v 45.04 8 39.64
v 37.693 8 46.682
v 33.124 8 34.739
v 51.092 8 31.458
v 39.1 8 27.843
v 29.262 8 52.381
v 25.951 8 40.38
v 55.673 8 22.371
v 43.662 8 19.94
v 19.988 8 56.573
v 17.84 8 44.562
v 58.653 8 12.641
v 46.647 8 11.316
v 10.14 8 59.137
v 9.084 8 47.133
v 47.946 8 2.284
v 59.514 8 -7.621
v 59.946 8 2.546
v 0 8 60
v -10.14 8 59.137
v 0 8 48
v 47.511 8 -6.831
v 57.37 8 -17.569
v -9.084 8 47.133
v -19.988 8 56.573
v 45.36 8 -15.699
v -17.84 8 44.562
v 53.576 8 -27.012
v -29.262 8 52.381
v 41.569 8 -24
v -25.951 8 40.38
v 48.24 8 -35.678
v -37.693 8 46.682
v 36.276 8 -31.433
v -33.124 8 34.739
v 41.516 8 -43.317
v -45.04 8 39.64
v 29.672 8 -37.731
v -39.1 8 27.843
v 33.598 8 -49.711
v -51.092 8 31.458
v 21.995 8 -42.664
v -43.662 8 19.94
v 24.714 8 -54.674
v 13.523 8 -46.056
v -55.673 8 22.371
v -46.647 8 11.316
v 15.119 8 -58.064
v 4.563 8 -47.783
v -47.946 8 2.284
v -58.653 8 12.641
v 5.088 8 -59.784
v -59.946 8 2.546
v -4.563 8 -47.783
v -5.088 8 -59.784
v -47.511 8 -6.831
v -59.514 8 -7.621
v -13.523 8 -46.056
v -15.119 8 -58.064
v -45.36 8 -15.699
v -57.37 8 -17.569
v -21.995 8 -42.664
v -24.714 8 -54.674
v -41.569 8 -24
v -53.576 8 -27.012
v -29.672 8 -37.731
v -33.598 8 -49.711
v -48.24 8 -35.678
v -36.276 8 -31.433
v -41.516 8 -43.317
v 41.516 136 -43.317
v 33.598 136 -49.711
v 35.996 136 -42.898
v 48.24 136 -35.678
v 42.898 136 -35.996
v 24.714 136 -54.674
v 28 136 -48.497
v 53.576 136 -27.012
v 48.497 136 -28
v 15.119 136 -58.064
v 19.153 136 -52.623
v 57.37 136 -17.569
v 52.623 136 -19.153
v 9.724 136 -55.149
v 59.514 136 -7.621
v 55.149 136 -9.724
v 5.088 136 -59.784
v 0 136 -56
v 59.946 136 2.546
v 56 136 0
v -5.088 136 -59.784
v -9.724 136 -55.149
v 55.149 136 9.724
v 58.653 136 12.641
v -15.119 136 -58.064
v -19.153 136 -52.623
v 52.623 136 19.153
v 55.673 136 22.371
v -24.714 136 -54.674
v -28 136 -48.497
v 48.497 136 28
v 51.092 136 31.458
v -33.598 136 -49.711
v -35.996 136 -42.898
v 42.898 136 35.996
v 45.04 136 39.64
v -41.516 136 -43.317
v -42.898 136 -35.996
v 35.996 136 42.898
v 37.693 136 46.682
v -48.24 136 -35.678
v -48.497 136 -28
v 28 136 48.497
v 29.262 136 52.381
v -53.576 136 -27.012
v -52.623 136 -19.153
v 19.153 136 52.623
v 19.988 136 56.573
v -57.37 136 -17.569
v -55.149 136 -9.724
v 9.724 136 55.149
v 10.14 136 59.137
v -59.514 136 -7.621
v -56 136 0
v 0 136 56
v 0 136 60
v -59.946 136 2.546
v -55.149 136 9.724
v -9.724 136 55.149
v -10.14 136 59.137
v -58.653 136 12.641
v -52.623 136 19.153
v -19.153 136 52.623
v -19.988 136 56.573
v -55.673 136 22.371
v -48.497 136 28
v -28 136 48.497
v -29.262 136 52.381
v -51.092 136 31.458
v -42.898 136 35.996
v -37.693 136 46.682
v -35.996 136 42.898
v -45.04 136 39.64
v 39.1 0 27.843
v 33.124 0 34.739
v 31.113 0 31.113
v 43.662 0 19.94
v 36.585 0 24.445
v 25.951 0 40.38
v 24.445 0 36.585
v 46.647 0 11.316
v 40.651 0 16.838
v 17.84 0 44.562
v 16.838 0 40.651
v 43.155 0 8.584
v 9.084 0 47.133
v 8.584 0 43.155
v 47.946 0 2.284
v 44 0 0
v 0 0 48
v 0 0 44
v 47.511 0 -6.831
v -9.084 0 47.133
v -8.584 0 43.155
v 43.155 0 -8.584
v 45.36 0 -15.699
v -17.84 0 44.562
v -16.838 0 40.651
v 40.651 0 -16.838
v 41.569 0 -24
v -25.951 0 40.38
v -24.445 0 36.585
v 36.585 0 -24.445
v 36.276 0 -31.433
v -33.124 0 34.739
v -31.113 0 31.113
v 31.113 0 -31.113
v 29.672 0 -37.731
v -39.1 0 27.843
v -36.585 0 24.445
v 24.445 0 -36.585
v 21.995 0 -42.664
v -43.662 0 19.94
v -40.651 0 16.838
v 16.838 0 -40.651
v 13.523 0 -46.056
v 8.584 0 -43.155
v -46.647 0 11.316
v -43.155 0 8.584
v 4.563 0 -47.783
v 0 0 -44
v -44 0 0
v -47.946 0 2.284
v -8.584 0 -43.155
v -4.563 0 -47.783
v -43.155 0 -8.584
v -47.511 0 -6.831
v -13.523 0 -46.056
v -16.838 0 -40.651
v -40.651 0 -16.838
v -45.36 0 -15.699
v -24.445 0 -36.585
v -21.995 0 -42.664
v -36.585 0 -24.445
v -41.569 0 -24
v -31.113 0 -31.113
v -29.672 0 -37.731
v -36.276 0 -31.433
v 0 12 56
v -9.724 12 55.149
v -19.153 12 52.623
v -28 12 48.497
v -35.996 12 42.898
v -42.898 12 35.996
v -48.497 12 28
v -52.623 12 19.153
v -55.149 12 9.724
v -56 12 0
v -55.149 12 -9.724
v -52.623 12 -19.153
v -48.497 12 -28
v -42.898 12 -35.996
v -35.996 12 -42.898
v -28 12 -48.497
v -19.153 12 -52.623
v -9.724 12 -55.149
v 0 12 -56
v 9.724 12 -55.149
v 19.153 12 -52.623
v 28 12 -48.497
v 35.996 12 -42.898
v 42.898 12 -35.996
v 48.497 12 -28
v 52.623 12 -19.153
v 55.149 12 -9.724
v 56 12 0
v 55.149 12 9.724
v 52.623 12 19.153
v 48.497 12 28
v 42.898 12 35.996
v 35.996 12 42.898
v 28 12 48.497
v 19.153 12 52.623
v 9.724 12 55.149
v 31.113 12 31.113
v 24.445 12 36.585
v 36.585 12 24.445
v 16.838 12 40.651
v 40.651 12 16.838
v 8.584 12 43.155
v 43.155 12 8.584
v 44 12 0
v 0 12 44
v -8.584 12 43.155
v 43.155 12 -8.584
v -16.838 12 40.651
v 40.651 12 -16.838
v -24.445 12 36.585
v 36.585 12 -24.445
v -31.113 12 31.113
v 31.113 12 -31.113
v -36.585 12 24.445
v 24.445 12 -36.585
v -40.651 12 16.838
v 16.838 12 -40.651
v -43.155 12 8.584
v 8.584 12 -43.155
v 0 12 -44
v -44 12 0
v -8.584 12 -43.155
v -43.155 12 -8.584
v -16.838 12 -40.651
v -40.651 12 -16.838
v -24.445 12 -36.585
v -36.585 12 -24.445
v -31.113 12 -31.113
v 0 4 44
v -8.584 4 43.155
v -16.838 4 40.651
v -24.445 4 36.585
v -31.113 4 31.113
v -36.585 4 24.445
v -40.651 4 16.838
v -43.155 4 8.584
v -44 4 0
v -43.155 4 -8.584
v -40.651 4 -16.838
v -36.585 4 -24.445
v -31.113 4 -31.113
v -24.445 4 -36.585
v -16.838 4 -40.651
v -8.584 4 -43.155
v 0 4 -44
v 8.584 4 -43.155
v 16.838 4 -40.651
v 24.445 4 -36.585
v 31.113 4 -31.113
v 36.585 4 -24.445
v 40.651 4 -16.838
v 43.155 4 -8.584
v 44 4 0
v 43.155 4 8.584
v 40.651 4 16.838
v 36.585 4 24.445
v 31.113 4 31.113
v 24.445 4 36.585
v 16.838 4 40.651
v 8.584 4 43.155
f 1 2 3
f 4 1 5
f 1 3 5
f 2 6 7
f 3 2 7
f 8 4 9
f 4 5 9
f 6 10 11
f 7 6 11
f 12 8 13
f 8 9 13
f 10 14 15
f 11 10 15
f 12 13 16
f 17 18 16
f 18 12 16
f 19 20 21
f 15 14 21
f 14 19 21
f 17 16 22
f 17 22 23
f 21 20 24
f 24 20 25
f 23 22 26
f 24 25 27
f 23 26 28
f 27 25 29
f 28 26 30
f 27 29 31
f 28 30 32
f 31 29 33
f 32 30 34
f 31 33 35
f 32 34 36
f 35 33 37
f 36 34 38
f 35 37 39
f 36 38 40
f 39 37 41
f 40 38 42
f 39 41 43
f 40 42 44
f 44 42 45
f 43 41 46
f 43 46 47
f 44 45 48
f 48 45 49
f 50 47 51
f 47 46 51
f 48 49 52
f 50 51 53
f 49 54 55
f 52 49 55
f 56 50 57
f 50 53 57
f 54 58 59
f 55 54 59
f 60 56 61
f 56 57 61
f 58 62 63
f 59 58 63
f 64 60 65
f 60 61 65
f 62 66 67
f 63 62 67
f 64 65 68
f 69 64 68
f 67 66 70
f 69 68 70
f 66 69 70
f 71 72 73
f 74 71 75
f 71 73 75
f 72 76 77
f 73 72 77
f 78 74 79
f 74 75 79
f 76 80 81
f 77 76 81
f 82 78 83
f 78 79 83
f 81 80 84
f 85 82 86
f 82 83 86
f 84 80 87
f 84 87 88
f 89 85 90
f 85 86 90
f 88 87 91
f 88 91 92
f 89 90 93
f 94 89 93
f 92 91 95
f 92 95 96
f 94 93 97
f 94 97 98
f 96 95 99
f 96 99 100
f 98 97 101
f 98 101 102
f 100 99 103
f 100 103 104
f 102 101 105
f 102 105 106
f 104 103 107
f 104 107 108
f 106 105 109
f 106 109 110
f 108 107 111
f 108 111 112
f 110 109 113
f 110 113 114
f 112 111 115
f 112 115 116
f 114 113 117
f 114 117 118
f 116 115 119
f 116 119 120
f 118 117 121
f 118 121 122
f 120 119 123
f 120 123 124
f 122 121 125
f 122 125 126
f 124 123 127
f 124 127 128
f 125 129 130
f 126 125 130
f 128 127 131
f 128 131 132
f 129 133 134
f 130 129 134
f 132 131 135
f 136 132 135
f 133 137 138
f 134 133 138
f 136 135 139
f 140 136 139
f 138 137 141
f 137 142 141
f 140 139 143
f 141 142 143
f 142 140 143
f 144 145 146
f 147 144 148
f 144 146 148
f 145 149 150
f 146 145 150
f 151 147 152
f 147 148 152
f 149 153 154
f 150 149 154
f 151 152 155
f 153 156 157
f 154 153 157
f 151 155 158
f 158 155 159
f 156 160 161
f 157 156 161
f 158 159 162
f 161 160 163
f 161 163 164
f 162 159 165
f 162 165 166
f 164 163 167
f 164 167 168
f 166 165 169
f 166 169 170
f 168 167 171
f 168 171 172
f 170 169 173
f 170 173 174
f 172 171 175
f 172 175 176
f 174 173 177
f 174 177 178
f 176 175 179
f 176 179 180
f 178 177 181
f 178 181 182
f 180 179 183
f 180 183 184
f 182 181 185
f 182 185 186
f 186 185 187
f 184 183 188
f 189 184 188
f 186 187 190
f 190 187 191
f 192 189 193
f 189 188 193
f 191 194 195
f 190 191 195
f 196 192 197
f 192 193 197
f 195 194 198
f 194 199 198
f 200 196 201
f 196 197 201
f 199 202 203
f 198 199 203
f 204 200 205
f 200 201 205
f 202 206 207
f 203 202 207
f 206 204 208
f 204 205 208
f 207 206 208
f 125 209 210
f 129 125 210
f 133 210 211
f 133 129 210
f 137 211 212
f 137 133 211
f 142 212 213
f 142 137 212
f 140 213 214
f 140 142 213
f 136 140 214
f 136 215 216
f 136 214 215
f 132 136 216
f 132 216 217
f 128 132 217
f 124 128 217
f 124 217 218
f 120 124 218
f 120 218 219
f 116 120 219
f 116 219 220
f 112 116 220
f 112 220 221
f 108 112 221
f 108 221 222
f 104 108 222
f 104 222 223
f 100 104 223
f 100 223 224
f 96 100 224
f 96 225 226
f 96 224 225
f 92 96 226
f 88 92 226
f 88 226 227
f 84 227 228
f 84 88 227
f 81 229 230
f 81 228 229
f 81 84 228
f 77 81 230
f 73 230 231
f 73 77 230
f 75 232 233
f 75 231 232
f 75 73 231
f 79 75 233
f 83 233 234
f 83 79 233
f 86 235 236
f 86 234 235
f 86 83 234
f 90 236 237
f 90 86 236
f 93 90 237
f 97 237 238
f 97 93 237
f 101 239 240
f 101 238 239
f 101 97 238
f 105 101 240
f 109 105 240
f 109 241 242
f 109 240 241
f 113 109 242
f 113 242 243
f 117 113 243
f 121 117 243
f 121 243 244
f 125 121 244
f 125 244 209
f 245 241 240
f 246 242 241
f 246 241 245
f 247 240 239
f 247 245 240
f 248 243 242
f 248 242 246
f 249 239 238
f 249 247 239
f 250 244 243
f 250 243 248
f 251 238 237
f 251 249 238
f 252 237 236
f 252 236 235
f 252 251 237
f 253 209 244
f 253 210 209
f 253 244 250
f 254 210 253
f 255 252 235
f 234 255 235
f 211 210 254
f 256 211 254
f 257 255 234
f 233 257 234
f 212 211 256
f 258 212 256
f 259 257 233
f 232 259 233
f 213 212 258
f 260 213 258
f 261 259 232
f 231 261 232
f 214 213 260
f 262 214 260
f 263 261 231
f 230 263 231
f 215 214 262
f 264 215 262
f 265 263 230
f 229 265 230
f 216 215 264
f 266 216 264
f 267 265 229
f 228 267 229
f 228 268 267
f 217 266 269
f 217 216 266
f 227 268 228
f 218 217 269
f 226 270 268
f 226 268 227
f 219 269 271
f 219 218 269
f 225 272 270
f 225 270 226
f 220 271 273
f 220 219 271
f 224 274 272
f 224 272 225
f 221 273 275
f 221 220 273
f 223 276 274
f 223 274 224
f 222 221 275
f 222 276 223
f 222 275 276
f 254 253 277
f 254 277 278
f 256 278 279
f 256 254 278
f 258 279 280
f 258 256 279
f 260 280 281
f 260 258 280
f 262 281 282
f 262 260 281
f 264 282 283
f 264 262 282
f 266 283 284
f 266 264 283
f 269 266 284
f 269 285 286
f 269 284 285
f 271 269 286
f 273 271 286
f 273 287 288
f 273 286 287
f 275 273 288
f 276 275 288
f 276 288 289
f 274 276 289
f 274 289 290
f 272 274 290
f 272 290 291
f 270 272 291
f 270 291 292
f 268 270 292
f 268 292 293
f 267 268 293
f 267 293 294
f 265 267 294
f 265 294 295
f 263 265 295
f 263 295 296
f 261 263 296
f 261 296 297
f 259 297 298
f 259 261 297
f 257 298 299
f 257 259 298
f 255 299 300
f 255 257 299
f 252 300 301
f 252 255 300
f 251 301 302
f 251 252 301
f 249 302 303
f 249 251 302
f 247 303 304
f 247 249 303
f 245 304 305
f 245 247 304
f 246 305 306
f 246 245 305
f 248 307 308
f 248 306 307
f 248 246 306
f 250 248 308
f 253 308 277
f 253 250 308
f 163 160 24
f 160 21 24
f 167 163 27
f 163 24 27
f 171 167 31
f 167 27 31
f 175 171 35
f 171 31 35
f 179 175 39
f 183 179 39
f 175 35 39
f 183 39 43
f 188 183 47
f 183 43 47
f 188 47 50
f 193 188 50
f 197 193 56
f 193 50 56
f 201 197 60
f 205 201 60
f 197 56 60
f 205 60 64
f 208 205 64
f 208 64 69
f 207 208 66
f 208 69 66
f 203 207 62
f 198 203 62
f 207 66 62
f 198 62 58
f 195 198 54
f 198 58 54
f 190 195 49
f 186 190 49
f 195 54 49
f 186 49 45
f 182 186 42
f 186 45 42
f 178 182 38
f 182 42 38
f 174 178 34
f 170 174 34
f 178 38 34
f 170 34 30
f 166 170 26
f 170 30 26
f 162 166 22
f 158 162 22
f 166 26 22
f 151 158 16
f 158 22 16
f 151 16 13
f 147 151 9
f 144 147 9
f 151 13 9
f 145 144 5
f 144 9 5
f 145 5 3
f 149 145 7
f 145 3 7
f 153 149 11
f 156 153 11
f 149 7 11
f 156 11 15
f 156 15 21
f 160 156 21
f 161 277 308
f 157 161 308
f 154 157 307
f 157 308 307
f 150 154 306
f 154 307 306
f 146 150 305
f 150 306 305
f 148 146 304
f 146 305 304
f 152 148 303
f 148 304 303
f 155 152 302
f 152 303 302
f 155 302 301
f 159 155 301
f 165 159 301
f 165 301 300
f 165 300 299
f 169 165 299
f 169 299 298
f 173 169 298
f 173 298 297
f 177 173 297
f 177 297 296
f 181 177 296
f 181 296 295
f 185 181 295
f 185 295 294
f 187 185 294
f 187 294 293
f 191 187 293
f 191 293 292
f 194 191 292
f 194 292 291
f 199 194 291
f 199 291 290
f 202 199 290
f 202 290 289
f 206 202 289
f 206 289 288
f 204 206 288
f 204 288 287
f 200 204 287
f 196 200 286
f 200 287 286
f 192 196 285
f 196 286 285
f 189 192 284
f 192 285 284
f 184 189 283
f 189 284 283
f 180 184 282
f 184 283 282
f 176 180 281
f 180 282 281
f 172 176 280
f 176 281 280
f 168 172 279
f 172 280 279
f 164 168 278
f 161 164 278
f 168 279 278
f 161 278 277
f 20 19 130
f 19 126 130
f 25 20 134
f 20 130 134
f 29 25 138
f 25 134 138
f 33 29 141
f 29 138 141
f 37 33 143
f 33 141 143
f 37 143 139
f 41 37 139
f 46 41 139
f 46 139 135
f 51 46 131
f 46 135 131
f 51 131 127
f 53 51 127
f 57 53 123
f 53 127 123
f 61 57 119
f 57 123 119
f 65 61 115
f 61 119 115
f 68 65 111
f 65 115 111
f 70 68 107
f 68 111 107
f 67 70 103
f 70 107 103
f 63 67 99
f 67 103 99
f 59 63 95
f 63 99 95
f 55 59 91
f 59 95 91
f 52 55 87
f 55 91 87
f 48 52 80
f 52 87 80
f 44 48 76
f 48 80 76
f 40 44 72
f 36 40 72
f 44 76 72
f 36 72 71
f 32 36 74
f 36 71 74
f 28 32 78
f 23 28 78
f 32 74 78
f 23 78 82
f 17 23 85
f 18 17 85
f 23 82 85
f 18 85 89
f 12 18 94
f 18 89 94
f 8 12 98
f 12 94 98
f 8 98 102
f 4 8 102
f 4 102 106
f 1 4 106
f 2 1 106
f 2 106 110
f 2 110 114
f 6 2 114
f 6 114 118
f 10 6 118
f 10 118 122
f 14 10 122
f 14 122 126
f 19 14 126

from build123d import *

# Parameters (mm, degrees)
GOBLET_SHELL_T                     = -4
SKETCH2_R                          = 44
CUT_TO_FIT_WITH_BLADE_CASING_DEPTH = 10


with BuildPart() as part:
    # Sketch1 → Goblet Revolve (revolve)
    with BuildSketch(Plane.XY, mode=Mode.PRIVATE) as goblet_revolve_sk:
        Polygon((0, 0), (48, 0), (48, 8), (60, 8), (60, 136), (0, 136), align=None)
    revolve(goblet_revolve_sk.sketch.rotate(Axis((0, 136, 0), (0, -1, 0)), 90), axis=Axis((0, 136, 0), (0, -1, 0)))

    # Goblet Shell
    goblet_shell_openings = [part.faces().sort_by_distance(p)[0] for p in [
        (0, 136, 0),
    ]]
    offset(amount=GOBLET_SHELL_T, openings=goblet_shell_openings, kind=Kind.INTERSECTION)

    # Sketch2 → Cut to Fit with Blade Casing (cut)
    with BuildSketch(Plane(origin=(0, 4, 0), x_dir=(1, 0, 0), z_dir=(0, 1, 0))):
        with Locations(Location((0, 0, 0), (0, 0, 270))):
            Circle(SKETCH2_R)
    extrude(amount=-CUT_TO_FIT_WITH_BLADE_CASING_DEPTH, mode=Mode.SUBTRACT)


solid = part.part
